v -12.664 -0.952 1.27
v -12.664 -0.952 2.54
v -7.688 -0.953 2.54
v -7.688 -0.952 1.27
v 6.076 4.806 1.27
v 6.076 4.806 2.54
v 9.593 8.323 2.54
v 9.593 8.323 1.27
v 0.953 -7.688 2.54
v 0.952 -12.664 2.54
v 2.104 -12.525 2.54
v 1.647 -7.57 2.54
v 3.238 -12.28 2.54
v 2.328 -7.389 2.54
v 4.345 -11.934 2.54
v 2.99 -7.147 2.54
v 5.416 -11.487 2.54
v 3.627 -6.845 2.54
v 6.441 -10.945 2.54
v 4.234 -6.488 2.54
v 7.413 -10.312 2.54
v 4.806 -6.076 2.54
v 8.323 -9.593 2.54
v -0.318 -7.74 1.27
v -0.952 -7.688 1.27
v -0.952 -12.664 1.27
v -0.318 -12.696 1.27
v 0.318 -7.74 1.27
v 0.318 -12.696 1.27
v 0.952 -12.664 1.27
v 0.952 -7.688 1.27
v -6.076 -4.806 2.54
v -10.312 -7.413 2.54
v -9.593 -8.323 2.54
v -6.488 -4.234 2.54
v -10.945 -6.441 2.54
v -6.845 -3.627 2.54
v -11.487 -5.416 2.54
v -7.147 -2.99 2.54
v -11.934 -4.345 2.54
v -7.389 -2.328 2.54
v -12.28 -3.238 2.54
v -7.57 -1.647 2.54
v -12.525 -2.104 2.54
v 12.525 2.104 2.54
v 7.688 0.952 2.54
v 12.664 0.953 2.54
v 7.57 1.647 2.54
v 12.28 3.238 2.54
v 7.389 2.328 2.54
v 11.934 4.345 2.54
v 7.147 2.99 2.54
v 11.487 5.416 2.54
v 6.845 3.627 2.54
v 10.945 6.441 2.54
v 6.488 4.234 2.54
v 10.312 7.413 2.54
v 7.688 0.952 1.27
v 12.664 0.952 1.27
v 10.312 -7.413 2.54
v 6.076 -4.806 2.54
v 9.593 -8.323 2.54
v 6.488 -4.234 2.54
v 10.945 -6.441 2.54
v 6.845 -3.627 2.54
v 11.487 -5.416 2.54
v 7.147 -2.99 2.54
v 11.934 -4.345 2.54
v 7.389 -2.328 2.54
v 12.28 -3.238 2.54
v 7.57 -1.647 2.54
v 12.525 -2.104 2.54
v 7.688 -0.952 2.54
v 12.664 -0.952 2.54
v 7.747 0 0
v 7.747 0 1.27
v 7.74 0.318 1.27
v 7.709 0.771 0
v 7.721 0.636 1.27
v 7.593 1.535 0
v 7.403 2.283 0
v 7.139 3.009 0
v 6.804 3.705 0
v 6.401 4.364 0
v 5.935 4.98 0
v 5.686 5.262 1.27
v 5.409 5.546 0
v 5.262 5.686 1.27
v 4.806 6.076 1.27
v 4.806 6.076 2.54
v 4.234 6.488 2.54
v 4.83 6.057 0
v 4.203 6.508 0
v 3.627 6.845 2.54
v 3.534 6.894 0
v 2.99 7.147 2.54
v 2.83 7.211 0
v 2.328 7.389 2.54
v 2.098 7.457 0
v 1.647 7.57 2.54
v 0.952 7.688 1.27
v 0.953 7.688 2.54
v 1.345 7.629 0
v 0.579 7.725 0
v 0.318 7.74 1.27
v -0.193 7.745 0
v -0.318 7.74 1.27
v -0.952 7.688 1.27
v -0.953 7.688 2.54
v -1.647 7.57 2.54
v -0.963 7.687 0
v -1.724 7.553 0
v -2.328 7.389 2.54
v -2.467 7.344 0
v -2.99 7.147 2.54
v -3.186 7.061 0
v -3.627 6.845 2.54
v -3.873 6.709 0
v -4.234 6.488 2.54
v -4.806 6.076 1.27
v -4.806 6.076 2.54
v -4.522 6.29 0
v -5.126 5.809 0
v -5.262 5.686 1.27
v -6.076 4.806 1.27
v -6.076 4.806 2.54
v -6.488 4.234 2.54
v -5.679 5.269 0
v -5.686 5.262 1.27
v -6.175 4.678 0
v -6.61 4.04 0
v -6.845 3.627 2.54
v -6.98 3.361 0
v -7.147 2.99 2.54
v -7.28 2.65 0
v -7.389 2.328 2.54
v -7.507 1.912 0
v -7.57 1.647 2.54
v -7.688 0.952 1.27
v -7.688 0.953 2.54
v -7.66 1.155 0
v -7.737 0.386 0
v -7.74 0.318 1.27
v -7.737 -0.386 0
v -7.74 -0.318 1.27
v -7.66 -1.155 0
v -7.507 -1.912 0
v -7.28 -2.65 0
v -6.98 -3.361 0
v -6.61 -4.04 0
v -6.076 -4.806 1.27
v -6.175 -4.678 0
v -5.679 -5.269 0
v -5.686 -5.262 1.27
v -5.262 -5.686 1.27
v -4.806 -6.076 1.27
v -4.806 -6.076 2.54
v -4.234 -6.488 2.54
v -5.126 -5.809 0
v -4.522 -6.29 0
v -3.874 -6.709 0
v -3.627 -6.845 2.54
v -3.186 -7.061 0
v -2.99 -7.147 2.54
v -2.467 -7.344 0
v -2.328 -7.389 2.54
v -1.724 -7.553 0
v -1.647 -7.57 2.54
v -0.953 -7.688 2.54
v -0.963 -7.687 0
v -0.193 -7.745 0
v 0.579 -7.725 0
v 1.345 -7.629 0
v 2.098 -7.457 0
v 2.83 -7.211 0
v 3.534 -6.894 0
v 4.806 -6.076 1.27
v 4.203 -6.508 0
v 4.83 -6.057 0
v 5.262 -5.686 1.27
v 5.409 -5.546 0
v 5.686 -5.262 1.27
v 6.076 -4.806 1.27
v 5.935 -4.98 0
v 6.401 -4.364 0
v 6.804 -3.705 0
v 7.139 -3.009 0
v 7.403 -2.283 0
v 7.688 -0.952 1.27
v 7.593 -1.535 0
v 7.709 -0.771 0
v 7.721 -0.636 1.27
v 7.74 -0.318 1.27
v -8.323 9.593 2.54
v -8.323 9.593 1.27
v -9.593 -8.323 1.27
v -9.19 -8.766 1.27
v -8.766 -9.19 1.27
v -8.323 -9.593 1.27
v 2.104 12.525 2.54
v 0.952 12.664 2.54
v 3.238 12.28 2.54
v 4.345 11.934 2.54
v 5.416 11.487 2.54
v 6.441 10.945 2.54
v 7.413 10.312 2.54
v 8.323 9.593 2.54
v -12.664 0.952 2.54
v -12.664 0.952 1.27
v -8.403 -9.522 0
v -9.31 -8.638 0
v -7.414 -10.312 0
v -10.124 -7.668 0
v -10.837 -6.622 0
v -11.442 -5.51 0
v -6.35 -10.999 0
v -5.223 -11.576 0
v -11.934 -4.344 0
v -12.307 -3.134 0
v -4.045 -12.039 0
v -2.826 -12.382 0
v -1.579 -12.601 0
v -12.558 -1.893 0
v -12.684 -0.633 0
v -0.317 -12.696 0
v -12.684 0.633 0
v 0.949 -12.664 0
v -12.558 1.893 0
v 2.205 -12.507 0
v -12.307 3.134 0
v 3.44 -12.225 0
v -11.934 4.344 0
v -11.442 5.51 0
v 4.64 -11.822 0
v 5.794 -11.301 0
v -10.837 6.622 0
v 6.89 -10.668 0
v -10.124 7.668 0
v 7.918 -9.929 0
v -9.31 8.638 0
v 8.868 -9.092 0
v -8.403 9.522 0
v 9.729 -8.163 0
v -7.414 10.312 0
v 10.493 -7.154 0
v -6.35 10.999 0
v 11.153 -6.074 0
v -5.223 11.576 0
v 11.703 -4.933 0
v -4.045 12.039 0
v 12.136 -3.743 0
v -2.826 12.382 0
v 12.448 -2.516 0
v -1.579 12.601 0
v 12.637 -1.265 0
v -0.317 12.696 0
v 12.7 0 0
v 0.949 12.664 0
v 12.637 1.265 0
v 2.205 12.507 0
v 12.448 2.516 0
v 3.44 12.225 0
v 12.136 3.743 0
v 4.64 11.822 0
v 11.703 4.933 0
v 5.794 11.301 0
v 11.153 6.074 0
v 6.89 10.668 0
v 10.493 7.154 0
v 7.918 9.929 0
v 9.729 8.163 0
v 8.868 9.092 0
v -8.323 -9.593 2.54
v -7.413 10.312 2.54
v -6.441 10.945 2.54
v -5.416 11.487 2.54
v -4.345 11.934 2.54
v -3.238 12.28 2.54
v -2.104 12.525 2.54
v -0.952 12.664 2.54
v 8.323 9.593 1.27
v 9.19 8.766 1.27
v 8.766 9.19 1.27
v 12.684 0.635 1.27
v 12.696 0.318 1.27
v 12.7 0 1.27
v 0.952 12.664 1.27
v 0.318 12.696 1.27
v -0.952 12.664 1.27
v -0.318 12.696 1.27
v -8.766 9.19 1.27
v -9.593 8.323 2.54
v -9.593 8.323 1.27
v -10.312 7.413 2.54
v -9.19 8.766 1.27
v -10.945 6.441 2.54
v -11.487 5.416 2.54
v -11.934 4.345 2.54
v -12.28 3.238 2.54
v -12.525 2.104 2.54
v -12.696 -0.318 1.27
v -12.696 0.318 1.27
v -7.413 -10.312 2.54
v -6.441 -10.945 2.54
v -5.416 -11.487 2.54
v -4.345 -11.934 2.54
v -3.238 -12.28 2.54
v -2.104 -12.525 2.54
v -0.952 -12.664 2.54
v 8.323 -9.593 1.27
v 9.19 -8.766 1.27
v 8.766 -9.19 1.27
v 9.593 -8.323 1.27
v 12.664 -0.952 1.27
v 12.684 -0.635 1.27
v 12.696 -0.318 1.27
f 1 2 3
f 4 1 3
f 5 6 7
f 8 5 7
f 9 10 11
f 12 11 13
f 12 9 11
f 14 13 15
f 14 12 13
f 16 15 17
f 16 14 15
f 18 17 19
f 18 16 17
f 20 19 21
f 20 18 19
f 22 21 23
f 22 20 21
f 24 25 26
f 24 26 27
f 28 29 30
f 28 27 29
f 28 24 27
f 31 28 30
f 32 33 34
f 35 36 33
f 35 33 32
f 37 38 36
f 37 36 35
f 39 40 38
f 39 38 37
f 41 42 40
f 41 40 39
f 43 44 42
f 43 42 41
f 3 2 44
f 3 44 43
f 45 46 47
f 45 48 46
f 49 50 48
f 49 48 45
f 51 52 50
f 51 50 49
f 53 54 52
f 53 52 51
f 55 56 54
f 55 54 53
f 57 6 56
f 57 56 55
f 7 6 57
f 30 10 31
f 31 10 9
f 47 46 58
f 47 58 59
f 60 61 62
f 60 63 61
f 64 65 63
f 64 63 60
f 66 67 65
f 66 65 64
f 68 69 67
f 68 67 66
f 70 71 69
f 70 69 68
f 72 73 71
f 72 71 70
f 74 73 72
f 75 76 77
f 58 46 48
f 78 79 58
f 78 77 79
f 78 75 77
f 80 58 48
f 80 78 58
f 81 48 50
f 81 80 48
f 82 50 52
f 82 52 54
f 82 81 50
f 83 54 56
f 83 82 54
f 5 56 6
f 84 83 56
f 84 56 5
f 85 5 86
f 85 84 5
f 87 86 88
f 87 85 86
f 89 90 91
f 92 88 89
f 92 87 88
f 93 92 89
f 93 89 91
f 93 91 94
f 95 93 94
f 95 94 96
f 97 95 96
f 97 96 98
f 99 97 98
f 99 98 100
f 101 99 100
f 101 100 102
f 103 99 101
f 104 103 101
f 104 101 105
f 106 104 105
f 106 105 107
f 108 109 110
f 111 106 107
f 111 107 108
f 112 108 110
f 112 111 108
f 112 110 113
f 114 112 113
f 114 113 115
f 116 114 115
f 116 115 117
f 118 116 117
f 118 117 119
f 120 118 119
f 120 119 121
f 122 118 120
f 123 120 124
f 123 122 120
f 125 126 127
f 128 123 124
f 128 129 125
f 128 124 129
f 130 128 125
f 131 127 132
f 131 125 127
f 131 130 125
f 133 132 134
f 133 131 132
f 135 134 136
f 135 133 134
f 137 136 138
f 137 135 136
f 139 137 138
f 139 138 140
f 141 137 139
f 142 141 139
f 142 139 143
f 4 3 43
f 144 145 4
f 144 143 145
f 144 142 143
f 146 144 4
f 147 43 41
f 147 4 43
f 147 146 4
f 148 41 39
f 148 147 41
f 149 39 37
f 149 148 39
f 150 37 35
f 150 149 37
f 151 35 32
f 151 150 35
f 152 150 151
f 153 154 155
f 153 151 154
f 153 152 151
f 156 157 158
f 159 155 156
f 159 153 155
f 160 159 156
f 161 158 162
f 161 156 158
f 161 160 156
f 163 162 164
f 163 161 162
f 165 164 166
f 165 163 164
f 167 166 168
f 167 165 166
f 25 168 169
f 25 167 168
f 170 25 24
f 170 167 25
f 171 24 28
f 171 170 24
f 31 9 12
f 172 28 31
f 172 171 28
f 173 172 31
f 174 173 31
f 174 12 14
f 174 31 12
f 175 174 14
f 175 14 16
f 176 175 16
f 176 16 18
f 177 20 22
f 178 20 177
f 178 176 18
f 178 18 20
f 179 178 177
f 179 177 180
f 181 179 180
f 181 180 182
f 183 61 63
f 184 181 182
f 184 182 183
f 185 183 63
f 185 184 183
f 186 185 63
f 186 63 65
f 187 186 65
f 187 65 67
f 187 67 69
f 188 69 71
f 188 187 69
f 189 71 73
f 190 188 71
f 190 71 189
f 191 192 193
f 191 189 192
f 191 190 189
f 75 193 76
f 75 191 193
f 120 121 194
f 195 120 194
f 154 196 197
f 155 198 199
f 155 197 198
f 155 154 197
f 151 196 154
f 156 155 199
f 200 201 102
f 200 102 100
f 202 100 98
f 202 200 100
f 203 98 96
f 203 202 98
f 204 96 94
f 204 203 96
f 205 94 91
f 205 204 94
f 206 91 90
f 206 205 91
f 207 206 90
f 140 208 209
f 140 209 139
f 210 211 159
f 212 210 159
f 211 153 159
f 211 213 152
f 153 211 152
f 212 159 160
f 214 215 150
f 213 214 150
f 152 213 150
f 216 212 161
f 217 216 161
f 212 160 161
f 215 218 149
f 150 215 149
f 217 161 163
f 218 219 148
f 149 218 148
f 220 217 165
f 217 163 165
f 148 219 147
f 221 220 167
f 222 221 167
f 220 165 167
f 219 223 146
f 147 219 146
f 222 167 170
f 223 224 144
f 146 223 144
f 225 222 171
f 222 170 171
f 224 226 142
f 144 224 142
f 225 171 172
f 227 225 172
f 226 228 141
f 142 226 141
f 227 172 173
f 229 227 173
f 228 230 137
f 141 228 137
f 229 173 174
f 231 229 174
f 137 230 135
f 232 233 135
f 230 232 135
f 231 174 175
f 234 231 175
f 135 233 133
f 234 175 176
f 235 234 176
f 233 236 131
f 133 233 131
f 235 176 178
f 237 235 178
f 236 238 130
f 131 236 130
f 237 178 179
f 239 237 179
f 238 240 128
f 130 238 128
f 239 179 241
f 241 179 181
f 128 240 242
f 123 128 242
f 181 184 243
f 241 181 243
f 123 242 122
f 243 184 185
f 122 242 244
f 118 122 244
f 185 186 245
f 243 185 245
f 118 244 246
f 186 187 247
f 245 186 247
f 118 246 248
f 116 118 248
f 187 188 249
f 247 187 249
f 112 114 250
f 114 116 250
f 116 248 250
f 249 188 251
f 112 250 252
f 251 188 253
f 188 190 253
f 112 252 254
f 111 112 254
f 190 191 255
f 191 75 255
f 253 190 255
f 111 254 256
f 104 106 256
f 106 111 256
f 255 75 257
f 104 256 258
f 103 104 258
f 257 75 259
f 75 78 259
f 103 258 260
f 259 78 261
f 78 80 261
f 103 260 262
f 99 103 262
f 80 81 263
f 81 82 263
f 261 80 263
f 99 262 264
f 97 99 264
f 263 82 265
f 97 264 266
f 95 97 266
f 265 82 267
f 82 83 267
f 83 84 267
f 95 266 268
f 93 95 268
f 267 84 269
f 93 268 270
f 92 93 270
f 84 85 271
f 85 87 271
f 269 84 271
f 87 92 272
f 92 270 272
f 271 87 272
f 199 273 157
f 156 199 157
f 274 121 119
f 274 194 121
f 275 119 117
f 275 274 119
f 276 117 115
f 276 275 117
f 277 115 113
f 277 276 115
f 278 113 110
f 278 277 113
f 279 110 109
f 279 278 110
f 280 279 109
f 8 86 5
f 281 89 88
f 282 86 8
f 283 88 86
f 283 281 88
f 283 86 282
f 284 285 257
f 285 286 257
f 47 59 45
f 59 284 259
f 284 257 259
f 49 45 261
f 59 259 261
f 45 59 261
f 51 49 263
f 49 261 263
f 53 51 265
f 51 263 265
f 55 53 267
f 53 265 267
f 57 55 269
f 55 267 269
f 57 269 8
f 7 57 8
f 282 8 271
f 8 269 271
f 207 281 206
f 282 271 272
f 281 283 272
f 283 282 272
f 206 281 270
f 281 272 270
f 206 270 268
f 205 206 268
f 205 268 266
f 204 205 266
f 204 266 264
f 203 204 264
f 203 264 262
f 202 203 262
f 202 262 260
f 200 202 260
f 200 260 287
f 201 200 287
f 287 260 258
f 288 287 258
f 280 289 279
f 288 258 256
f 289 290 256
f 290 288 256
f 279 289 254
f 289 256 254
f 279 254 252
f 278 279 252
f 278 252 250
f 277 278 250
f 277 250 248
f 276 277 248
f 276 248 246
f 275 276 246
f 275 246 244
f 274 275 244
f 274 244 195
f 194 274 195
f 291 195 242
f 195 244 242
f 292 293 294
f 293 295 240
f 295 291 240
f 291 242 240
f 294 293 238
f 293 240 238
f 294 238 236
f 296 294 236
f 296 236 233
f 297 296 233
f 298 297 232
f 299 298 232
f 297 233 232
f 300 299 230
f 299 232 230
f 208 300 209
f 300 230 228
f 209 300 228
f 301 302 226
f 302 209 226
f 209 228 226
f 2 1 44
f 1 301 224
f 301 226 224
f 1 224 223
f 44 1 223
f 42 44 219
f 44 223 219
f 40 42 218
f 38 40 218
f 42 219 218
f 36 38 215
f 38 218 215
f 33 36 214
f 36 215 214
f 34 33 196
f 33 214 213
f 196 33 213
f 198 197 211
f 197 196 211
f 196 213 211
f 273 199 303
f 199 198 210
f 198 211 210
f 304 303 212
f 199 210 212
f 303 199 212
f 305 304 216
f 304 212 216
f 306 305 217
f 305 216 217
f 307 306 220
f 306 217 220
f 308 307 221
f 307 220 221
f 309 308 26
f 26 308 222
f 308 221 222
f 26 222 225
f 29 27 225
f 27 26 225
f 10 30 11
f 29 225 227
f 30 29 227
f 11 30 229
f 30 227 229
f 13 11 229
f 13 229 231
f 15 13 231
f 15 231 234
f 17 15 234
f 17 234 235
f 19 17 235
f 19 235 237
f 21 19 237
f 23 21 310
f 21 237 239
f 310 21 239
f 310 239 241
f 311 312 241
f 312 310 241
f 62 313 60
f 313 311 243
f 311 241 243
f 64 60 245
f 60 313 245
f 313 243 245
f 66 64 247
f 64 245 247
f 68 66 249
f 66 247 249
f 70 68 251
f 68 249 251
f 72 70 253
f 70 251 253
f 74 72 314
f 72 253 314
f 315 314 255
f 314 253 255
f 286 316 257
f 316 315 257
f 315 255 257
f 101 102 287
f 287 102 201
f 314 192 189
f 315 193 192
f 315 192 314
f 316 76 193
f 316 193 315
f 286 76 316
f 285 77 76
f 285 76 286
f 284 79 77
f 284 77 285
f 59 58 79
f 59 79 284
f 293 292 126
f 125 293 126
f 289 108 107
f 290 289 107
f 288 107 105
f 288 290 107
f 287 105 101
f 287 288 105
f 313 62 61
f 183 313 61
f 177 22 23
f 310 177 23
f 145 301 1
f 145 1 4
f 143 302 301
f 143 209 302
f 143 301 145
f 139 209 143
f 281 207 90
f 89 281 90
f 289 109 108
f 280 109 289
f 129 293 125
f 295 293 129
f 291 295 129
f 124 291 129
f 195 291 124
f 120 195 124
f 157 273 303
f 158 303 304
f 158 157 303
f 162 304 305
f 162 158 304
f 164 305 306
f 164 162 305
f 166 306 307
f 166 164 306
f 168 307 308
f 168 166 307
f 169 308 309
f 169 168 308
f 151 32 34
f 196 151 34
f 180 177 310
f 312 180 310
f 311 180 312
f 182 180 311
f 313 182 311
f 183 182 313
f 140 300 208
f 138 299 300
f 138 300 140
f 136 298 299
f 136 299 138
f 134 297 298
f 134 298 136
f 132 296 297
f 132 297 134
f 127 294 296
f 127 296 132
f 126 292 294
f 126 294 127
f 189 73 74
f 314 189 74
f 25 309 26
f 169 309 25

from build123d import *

# Parameters (mm, degrees)
F0_R     = 12.7
F0_R_2   = 7.747
F1_DEPTH = 2.54
F3_DEPTH = 1.27
F4_W     = 1.905
F4_H     = 11.7475
F4_W_2   = 11.7475
F4_H_2   = 1.905
F5_DEPTH = 1.27


with BuildPart() as f1:
    # F0 (on Top) → F1 (new body)
    with BuildSketch(Plane.XY):
        Circle(F0_R)
        Circle(F0_R_2, mode=Mode.SUBTRACT)
    extrude(amount=F1_DEPTH)

    # F2 (on face) → F3 (cut)
    with BuildSketch(Plane.XY.offset(2.54)):
        Polygon((0, 1.27), (0, 0), (6.35, 6.35), (9.698677, 9.698677), (8.428677, 9.698677), align=None)
        Polygon((-1.27, 0), (0, 0), (-6.35, 6.35), (-9.698677, 9.698677), (-9.698677, 8.428677), align=None)
        Polygon((1.27, 0), (0, 0), (6.35, -6.35), (9.698677, -9.698677), (9.698677, -8.428677), align=None)
        Polygon((0, -1.27), (0, 0), (-6.35, -6.35), (-9.698677, -9.698677), (-8.428677, -9.698677), align=None)
        Polygon((6.35, 6.35), (0, 0), (1.27, 0), (9.698677, 8.428677), (9.698677, 9.698677), align=None)
        Polygon((-6.35, 6.35), (0, 0), (0, 1.27), (-8.428677, 9.698677), (-9.698677, 9.698677), align=None)
        Polygon((6.35, -6.35), (0, 0), (0, -1.27), (8.428677, -9.698677), (9.698677, -9.698677), align=None)
        Polygon((-6.35, -6.35), (0, 0), (-1.27, 0), (-9.698677, -8.428677), (-9.698677, -9.698677), align=None)
    extrude(amount=-F3_DEPTH, mode=Mode.SUBTRACT)

    # F4 (on face) → F5 (cut)
    with BuildSketch(Plane.XY.offset(2.54)):
        with Locations((0, -6.82625)):
            Rectangle(F4_W, F4_H)
        with Locations((6.82625, 0)):
            Rectangle(F4_W_2, F4_H_2)
        with Locations((-6.82625, 0)):
            Rectangle(F4_W_2, F4_H_2)
        with Locations((0, 6.82625)):
            Rectangle(F4_W, F4_H)
    extrude(amount=-F5_DEPTH, mode=Mode.SUBTRACT)


solid = f1.part
